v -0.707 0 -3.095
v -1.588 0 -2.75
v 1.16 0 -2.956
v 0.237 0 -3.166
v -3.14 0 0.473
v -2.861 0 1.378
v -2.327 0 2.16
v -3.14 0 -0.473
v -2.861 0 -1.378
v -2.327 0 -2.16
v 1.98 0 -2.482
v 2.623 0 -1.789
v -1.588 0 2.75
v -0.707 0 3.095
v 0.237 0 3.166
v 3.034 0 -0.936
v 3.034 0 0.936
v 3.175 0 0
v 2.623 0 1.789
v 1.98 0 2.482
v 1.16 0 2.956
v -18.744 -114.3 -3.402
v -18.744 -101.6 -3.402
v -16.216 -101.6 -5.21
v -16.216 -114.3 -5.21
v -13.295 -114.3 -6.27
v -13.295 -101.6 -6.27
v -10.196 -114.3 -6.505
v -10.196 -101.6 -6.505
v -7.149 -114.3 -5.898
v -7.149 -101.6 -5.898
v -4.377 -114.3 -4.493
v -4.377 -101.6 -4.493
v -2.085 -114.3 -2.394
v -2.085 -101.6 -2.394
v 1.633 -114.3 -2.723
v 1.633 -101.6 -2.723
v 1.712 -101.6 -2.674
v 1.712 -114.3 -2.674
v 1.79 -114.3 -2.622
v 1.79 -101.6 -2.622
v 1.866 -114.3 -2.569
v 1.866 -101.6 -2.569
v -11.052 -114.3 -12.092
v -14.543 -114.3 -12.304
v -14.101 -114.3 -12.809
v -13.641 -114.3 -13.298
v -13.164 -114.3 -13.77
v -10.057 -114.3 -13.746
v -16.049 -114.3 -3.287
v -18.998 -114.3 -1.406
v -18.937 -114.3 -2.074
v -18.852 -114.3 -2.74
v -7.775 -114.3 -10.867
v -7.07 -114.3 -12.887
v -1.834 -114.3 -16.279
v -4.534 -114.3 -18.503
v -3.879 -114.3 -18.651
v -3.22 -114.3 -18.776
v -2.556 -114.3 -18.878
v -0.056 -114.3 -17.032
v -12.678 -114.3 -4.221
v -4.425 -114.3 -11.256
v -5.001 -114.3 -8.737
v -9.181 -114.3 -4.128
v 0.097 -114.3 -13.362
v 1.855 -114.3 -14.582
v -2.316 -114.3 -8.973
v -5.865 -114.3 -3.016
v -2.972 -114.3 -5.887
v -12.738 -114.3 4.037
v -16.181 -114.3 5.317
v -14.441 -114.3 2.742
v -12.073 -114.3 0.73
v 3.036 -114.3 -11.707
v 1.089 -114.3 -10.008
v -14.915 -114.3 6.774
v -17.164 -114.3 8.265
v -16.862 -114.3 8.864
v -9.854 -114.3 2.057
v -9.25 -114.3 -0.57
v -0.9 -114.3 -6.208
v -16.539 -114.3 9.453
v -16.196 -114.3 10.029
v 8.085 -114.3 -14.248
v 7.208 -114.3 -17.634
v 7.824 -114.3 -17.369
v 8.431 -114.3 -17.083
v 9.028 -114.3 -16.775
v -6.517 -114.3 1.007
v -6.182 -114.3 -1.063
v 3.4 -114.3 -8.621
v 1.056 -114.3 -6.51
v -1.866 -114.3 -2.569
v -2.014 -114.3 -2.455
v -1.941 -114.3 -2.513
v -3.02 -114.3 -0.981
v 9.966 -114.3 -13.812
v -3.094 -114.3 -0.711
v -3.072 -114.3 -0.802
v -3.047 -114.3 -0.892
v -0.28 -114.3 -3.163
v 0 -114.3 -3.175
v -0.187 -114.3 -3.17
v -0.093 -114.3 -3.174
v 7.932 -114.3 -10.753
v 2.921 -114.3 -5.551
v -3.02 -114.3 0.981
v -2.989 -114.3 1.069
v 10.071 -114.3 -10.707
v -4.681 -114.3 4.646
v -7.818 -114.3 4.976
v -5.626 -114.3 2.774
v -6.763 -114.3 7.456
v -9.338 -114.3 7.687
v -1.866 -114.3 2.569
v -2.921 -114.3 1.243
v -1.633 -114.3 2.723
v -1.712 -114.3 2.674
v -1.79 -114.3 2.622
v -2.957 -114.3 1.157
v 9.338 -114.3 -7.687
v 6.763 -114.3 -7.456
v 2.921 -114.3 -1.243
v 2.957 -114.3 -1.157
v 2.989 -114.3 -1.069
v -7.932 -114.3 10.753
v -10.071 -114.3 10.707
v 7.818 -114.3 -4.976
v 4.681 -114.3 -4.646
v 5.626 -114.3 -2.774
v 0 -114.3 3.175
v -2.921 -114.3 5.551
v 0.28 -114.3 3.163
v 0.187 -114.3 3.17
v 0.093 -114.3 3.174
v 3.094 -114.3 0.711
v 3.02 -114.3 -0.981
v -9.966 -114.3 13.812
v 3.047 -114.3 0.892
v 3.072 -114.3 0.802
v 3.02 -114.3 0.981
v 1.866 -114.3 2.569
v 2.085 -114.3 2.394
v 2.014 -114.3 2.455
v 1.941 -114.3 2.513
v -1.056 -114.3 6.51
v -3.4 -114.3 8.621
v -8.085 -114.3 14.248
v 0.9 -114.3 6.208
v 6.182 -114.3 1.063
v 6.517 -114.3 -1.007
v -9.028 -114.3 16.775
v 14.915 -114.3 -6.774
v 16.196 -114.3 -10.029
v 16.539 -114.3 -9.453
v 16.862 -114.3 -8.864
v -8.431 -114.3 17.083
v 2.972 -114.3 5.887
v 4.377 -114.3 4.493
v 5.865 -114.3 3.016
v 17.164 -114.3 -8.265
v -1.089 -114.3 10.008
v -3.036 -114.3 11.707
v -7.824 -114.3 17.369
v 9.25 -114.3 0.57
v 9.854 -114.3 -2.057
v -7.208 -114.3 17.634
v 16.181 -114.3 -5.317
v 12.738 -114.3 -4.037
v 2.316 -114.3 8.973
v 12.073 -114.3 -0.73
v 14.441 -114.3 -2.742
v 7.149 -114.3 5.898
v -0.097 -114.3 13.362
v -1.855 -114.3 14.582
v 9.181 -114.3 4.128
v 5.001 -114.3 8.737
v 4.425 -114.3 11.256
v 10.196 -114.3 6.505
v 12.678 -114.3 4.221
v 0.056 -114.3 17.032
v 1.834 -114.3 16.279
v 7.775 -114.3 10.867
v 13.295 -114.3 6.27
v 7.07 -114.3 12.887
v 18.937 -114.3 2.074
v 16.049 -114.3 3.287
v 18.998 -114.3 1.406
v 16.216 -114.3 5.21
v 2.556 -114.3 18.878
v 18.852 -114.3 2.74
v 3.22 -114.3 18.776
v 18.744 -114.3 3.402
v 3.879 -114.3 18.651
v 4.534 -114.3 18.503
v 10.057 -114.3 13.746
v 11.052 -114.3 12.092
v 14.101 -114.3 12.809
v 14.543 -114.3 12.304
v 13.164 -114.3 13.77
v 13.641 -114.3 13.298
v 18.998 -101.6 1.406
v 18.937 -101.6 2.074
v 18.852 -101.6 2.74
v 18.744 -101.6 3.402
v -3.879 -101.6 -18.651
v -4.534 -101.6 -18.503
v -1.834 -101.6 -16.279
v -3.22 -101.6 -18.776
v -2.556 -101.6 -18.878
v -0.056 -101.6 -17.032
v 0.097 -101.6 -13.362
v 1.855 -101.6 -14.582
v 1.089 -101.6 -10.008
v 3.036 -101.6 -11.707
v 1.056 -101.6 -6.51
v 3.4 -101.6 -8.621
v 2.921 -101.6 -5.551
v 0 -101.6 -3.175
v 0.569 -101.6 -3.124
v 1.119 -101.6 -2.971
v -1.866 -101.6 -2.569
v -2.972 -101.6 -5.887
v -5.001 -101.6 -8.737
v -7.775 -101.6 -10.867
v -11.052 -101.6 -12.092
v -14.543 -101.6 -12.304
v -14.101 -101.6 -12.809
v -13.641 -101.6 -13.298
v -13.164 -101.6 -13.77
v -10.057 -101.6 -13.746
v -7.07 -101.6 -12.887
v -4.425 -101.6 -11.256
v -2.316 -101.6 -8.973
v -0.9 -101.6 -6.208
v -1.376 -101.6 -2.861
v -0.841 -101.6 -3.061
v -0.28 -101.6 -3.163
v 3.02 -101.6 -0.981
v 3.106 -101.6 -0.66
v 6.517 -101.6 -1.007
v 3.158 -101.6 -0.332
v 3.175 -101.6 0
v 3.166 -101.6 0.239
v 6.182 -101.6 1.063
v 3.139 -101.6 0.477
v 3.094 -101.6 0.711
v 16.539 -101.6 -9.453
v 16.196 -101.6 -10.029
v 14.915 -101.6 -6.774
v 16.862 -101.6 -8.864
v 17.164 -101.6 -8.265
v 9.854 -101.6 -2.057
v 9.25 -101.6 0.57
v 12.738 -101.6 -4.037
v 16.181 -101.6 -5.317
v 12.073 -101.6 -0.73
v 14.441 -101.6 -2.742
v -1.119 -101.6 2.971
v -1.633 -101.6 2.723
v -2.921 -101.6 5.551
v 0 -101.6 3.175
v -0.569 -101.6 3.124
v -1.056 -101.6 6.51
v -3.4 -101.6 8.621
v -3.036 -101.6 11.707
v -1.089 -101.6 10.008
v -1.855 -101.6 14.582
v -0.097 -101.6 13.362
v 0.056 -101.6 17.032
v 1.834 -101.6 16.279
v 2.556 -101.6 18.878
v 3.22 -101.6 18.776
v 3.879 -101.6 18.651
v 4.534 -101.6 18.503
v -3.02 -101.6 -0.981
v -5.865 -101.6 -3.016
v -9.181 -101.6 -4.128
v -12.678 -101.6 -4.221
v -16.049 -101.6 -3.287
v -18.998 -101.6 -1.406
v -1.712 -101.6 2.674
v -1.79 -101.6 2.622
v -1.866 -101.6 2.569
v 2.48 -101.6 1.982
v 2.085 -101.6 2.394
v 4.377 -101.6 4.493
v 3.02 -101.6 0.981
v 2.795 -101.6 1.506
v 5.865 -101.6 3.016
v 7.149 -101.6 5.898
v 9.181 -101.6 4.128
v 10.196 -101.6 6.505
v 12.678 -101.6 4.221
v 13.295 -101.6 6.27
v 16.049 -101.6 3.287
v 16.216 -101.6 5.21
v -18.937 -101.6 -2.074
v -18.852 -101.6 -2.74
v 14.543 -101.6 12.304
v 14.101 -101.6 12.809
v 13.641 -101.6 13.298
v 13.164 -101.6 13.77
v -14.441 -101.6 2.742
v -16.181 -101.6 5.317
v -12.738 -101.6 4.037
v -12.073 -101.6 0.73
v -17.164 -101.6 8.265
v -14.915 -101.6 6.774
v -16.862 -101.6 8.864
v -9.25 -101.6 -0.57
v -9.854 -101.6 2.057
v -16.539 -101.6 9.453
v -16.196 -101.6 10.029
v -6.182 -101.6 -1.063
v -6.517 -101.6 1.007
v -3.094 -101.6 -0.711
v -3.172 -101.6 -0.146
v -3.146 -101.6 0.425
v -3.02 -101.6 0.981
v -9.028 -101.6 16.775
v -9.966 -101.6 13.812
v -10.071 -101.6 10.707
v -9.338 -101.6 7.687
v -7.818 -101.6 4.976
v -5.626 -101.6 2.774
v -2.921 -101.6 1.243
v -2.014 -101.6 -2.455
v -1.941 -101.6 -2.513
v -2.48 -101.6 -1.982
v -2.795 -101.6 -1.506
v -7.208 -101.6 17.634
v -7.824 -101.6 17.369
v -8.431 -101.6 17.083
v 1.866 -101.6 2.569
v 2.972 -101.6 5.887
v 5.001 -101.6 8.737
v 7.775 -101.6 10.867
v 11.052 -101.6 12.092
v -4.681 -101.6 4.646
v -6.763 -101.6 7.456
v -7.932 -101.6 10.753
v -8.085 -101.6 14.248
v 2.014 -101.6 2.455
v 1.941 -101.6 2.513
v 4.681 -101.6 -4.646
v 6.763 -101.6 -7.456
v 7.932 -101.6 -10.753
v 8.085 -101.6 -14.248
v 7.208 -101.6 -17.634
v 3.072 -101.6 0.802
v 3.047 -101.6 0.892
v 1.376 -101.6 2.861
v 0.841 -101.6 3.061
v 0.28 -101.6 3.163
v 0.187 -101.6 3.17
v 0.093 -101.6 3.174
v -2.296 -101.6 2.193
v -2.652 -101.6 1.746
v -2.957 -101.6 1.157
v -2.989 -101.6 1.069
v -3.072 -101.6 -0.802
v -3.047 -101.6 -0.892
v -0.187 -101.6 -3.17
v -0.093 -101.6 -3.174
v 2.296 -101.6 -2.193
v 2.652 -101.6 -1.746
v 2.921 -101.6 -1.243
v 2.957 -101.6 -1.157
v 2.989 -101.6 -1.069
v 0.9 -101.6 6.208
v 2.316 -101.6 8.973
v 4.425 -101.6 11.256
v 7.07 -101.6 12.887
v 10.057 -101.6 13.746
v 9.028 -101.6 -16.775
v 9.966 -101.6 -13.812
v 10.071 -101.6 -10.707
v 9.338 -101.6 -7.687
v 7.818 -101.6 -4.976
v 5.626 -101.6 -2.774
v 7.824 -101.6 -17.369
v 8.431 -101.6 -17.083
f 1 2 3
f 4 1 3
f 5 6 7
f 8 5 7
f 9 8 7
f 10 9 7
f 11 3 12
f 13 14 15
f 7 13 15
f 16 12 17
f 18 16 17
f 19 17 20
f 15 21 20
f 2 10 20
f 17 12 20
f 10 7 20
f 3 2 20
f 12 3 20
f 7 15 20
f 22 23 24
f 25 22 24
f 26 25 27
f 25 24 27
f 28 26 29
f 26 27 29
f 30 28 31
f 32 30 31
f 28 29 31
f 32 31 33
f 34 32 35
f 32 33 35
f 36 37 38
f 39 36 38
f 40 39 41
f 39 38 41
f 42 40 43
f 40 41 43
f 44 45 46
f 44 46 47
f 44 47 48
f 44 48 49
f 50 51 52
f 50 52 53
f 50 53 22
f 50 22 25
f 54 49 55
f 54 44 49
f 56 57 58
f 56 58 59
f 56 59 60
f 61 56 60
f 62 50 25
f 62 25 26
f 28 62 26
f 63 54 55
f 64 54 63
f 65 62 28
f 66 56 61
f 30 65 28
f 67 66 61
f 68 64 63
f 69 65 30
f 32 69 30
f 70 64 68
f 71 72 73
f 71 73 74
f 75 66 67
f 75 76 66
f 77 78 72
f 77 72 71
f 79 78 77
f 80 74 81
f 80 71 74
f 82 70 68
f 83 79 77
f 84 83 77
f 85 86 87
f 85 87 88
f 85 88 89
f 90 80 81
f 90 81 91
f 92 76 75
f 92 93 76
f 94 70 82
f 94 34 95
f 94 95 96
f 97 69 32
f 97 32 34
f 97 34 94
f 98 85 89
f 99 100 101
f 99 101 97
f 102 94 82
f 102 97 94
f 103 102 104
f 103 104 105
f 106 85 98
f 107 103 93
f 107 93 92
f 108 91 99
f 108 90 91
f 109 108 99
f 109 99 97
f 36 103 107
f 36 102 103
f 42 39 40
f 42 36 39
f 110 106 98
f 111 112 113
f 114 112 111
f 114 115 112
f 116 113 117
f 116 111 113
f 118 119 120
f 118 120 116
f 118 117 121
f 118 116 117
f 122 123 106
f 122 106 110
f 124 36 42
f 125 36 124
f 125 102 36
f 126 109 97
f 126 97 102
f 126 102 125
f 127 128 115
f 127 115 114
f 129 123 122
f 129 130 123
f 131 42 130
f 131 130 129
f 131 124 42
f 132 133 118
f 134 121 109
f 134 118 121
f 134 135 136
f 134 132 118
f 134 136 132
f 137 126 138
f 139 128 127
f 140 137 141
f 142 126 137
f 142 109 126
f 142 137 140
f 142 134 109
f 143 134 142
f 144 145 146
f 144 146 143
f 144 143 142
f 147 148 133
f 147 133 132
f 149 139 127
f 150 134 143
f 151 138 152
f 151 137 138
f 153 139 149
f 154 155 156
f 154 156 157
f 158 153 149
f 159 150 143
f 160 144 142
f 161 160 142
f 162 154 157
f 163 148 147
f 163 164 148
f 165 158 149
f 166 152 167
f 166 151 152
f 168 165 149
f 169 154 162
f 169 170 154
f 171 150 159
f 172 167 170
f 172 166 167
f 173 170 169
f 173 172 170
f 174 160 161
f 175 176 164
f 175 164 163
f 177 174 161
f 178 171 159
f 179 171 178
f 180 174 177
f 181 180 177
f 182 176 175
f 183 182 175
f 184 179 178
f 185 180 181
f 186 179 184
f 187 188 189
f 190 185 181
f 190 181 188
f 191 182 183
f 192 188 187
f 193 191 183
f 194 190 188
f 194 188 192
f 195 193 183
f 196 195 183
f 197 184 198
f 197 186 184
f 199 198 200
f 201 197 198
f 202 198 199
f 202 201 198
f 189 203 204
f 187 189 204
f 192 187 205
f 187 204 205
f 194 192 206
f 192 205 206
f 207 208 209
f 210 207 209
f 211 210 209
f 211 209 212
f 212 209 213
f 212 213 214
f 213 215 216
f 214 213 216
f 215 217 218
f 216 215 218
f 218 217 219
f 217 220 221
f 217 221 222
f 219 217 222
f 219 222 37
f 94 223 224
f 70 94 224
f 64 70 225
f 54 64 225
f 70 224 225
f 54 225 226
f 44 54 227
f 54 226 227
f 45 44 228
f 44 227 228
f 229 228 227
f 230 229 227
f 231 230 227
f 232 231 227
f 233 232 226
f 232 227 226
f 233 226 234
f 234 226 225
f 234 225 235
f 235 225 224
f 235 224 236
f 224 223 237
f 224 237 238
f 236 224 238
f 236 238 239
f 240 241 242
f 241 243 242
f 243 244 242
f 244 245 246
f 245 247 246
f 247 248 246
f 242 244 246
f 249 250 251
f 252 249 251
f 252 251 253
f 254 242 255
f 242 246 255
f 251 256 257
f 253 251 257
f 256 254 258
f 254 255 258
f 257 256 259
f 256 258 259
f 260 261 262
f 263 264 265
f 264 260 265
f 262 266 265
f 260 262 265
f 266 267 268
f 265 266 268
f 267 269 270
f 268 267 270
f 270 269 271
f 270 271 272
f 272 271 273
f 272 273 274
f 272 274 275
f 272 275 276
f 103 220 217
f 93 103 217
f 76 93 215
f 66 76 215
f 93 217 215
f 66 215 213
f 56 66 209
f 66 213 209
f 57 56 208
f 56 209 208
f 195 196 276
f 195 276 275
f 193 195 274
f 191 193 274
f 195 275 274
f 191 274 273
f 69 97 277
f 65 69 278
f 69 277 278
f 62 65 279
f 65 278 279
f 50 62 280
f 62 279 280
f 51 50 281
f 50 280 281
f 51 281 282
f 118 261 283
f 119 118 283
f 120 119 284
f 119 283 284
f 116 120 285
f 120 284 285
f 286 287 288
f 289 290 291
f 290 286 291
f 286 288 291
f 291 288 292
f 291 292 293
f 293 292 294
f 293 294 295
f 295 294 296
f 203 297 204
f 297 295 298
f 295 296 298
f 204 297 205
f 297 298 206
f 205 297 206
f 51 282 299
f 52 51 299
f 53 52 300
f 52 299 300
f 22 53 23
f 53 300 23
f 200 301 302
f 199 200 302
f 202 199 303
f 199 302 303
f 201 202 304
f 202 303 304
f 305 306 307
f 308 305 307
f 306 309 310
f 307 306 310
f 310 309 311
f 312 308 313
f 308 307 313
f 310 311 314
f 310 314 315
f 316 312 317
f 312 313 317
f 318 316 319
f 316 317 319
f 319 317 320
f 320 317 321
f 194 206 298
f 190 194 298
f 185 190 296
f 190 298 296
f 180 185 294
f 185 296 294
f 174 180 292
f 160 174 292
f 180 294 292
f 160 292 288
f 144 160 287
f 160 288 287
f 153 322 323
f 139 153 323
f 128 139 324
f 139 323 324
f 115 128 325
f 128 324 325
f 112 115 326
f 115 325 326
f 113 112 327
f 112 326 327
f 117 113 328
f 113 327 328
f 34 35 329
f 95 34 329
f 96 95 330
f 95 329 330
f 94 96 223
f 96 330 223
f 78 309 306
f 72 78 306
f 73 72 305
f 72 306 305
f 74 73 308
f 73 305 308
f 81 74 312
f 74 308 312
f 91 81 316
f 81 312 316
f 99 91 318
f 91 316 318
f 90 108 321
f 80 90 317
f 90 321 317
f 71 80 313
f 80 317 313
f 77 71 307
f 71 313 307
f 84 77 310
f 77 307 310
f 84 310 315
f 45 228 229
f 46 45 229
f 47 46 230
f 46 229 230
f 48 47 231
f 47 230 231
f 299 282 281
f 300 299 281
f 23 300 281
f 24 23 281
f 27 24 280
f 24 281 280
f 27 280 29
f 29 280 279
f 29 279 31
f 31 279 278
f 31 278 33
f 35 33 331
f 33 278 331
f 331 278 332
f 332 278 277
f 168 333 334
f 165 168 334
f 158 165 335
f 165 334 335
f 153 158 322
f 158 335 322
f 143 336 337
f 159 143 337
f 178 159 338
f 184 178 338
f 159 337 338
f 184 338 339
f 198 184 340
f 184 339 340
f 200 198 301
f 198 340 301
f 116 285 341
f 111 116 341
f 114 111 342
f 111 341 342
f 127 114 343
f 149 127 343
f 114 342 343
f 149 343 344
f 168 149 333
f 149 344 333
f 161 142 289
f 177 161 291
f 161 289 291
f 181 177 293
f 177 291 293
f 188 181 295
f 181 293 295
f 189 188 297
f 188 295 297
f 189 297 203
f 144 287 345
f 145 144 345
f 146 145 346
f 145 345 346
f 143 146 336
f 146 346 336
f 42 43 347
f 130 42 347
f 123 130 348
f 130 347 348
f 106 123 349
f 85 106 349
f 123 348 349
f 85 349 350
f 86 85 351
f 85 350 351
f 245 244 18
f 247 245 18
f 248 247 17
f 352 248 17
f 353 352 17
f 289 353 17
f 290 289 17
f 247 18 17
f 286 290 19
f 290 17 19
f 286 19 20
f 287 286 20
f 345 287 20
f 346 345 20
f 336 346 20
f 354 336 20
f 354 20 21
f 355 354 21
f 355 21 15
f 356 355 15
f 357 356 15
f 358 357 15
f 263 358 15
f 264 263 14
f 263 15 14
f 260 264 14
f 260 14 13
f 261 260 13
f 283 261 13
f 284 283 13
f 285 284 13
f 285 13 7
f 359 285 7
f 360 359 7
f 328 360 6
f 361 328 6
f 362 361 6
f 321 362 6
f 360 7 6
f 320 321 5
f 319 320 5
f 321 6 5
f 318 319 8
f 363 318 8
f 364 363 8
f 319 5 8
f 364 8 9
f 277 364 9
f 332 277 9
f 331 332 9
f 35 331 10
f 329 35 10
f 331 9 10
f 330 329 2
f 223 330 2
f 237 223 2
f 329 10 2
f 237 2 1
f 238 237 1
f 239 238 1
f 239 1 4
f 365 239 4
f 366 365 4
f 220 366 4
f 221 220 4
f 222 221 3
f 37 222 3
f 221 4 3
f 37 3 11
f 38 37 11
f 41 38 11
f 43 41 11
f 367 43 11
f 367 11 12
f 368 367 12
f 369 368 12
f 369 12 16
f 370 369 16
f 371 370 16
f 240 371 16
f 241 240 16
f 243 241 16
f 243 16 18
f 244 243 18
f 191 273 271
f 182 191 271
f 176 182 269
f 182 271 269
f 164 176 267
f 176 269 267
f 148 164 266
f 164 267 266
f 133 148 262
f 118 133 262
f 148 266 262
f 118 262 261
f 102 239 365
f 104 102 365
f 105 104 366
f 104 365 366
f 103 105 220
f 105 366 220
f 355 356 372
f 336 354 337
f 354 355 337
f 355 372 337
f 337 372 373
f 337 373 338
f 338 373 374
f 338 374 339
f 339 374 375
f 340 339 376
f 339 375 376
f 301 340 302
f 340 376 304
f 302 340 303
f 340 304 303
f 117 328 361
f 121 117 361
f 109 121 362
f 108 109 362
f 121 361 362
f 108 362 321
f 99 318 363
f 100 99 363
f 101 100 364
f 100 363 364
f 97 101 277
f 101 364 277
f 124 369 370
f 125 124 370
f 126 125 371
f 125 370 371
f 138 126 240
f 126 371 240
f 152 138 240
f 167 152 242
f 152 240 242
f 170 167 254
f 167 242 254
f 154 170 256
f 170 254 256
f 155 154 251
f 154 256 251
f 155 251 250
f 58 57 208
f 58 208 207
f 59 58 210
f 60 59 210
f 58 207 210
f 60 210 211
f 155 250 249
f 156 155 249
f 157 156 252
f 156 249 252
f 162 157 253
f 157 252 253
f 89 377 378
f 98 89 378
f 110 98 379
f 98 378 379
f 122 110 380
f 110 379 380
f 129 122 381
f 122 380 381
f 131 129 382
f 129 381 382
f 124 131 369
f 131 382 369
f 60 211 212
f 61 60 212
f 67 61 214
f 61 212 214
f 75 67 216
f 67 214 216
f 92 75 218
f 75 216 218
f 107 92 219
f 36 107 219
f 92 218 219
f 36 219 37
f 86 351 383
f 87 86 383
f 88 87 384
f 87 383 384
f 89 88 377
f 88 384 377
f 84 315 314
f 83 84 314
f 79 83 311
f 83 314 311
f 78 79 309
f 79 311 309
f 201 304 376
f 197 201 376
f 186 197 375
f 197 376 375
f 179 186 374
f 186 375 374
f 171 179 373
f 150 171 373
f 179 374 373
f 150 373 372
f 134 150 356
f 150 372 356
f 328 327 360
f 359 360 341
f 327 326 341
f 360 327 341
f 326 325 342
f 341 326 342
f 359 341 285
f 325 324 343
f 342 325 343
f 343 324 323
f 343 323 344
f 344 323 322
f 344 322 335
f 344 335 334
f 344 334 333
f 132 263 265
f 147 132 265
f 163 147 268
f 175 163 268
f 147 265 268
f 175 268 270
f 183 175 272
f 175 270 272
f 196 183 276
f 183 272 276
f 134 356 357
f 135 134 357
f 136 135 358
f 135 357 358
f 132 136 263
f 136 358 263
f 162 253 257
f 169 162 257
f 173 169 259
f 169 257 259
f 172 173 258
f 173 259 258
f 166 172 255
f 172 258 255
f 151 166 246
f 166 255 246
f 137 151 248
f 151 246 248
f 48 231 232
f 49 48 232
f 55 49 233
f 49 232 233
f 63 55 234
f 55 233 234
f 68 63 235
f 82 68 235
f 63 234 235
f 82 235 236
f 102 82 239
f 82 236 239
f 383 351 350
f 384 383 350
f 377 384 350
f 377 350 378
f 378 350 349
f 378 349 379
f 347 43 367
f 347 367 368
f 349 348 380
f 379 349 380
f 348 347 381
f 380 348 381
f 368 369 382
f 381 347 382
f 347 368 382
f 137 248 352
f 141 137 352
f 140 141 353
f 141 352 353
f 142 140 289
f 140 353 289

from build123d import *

# Parameters (mm, degrees)
F0_R     = 3.175
F1_DEPTH = 101.6
F3_DEPTH = 12.7


with BuildPart() as f1:
    # F0 (on Front) → F1 (new body)
    with BuildSketch(Plane.XZ):
        Circle(F0_R)
    extrude(amount=F1_DEPTH)

    # F2 (on face) → F3 (join)
    with BuildSketch(Plane.XZ.offset(101.6)):
        with BuildLine():
            ThreePointArc((0, 3.175), (-0.717894, 11.721662), (4.533669, 18.502658))
            ThreePointArc((4.533669, 18.502658), (3.549938, 18.716315), (2.556295, 18.877708))
            ThreePointArc((2.556295, 18.877708), (-3.036137, 11.70738), (-1.6328, 2.722974))
            ThreePointArc((-1.6328, 2.722974), (-0.847108, 3.059907), (0, 3.175))
        make_face()
        with BuildLine():
            ThreePointArc((1.866218, 2.568629), (6.309032, 9.904992), (14.543404, 12.304141))
            ThreePointArc((14.543404, 12.304141), (13.873134, 13.055215), (13.164125, 13.769834))
            ThreePointArc((13.164125, 13.769834), (4.425139, 11.256066), (0.279561, 3.162668))
            ThreePointArc((0.279561, 3.162668), (1.113244, 2.973434), (1.866218, 2.568629))
        make_face()
        with BuildLine():
            ThreePointArc((3.019604, 0.981129), (10.926122, 4.304951), (18.998054, 1.405861))
            ThreePointArc((18.998054, 1.405861), (18.897264, 2.407467), (18.743706, 3.402351))
            ThreePointArc((18.743706, 3.402351), (10.196162, 6.505317), (2.085139, 2.394331))
            ThreePointArc((2.085139, 2.394331), (2.648374, 1.751211), (3.019604, 0.981129))
        make_face()
        with BuildLine():
            ThreePointArc((16.196093, -10.029411), (16.703282, -9.159851), (17.163828, -8.264714))
            ThreePointArc((17.163828, -8.264714), (12.072598, -0.730242), (3.094265, 0.71144))
            ThreePointArc((3.094265, 0.71144), (3.154752, 0.358003), (3.175, 0))
            ThreePointArc((3.175, 0), (3.13591, -0.496679), (3.019604, -0.981129))
            ThreePointArc((3.019604, -0.981129), (11.369805, -2.939435), (16.196093, -10.029411))
        make_face()
        with BuildLine():
            ThreePointArc((-4.533669, -18.502658), (-3.549938, -18.716315), (-2.556295, -18.877708))
            ThreePointArc((-2.556295, -18.877708), (3.036137, -11.70738), (1.6328, -2.722974))
            ThreePointArc((1.6328, -2.722974), (0.847108, -3.059907), (0, -3.175))
            ThreePointArc((0, -3.175), (0.717894, -11.721662), (-4.533669, -18.502658))
        make_face()
        with BuildLine():
            ThreePointArc((7.207774, -17.633788), (8.129213, -17.228418), (9.027952, -16.774939))
            ThreePointArc((9.027952, -16.774939), (9.337711, -7.686873), (2.921487, -1.243196))
            ThreePointArc((2.921487, -1.243196), (2.483893, -1.9776), (1.866218, -2.568629))
            ThreePointArc((1.866218, -2.568629), (7.470609, -9.061056), (7.207774, -17.633788))
        make_face()
        with BuildLine():
            ThreePointArc((-14.543404, -12.304141), (-13.873134, -13.055215), (-13.164125, -13.769834))
            ThreePointArc((-13.164125, -13.769834), (-4.425139, -11.256066), (-0.279561, -3.162668))
            ThreePointArc((-0.279561, -3.162668), (-1.113244, -2.973434), (-1.866218, -2.568629))
            ThreePointArc((-1.866218, -2.568629), (-6.309032, -9.904992), (-14.543404, -12.304141))
        make_face()
        with BuildLine():
            ThreePointArc((-18.998054, -1.405861), (-18.897264, -2.407467), (-18.743706, -3.402351))
            ThreePointArc((-18.743706, -3.402351), (-10.196162, -6.505317), (-2.085139, -2.394331))
            ThreePointArc((-2.085139, -2.394331), (-2.648374, -1.751211), (-3.019604, -0.981129))
            ThreePointArc((-3.019604, -0.981129), (-10.926122, -4.304951), (-18.998054, -1.405861))
        make_face()
        with BuildLine():
            ThreePointArc((-3.019604, 0.981129), (-11.369805, 2.939435), (-16.196093, 10.029411))
            ThreePointArc((-16.196093, 10.029411), (-16.703282, 9.159851), (-17.163828, 8.264714))
            ThreePointArc((-17.163828, 8.264714), (-12.072598, 0.730242), (-3.094265, -0.71144))
            ThreePointArc((-3.094265, -0.71144), (-3.171916, 0.139916), (-3.019604, 0.981129))
        make_face()
        with BuildLine():
            ThreePointArc((-1.866218, 2.568629), (-7.470609, 9.061056), (-7.207774, 17.633788))
            ThreePointArc((-7.207774, 17.633788), (-8.129213, 17.228418), (-9.027952, 16.774939))
            ThreePointArc((-9.027952, 16.774939), (-9.337711, 7.686873), (-2.921487, 1.243196))
            ThreePointArc((-2.921487, 1.243196), (-2.483893, 1.9776), (-1.866218, 2.568629))
        make_face()
        with BuildLine():
            ThreePointArc((3.094265, 0.71144), (3.059907, 0.847108), (3.019604, 0.981129))
            ThreePointArc((3.019604, 0.981129), (2.648374, 1.751211), (2.085139, 2.394331))
            ThreePointArc((2.085139, 2.394331), (1.9776, 2.483893), (1.866218, 2.568629))
            ThreePointArc((1.866218, 2.568629), (1.113244, 2.973434), (0.279561, 3.162668))
            ThreePointArc((0.279561, 3.162668), (0.139916, 3.171916), (0, 3.175))
            ThreePointArc((0, 3.175), (-0.847108, 3.059907), (-1.6328, 2.722974))
            ThreePointArc((-1.6328, 2.722974), (-1.751211, 2.648374), (-1.866218, 2.568629))
            ThreePointArc((-1.866218, 2.568629), (-2.483893, 1.9776), (-2.921487, 1.243196))
            ThreePointArc((-2.921487, 1.243196), (-2.973434, 1.113244), (-3.019604, 0.981129))
            ThreePointArc((-3.019604, 0.981129), (-3.171916, 0.139916), (-3.094265, -0.71144))
            ThreePointArc((-3.094265, -0.71144), (-3.059907, -0.847108), (-3.019604, -0.981129))
            ThreePointArc((-3.019604, -0.981129), (-2.648374, -1.751211), (-2.085139, -2.394331))
            ThreePointArc((-2.085139, -2.394331), (-1.9776, -2.483893), (-1.866218, -2.568629))
            ThreePointArc((-1.866218, -2.568629), (-1.113244, -2.973434), (-0.279561, -3.162668))
            ThreePointArc((-0.279561, -3.162668), (-0.139916, -3.171916), (0, -3.175))
            ThreePointArc((0, -3.175), (0.847108, -3.059907), (1.6328, -2.722974))
            ThreePointArc((1.6328, -2.722974), (1.751211, -2.648374), (1.866218, -2.568629))
            ThreePointArc((1.866218, -2.568629), (2.483893, -1.9776), (2.921487, -1.243196))
            ThreePointArc((2.921487, -1.243196), (2.973434, -1.113244), (3.019604, -0.981129))
            ThreePointArc((3.019604, -0.981129), (3.13591, -0.496679), (3.175, 0))
            ThreePointArc((3.175, 0), (3.154752, 0.358003), (3.094265, 0.71144))
        make_face()
    extrude(amount=F3_DEPTH)


solid = f1.part
